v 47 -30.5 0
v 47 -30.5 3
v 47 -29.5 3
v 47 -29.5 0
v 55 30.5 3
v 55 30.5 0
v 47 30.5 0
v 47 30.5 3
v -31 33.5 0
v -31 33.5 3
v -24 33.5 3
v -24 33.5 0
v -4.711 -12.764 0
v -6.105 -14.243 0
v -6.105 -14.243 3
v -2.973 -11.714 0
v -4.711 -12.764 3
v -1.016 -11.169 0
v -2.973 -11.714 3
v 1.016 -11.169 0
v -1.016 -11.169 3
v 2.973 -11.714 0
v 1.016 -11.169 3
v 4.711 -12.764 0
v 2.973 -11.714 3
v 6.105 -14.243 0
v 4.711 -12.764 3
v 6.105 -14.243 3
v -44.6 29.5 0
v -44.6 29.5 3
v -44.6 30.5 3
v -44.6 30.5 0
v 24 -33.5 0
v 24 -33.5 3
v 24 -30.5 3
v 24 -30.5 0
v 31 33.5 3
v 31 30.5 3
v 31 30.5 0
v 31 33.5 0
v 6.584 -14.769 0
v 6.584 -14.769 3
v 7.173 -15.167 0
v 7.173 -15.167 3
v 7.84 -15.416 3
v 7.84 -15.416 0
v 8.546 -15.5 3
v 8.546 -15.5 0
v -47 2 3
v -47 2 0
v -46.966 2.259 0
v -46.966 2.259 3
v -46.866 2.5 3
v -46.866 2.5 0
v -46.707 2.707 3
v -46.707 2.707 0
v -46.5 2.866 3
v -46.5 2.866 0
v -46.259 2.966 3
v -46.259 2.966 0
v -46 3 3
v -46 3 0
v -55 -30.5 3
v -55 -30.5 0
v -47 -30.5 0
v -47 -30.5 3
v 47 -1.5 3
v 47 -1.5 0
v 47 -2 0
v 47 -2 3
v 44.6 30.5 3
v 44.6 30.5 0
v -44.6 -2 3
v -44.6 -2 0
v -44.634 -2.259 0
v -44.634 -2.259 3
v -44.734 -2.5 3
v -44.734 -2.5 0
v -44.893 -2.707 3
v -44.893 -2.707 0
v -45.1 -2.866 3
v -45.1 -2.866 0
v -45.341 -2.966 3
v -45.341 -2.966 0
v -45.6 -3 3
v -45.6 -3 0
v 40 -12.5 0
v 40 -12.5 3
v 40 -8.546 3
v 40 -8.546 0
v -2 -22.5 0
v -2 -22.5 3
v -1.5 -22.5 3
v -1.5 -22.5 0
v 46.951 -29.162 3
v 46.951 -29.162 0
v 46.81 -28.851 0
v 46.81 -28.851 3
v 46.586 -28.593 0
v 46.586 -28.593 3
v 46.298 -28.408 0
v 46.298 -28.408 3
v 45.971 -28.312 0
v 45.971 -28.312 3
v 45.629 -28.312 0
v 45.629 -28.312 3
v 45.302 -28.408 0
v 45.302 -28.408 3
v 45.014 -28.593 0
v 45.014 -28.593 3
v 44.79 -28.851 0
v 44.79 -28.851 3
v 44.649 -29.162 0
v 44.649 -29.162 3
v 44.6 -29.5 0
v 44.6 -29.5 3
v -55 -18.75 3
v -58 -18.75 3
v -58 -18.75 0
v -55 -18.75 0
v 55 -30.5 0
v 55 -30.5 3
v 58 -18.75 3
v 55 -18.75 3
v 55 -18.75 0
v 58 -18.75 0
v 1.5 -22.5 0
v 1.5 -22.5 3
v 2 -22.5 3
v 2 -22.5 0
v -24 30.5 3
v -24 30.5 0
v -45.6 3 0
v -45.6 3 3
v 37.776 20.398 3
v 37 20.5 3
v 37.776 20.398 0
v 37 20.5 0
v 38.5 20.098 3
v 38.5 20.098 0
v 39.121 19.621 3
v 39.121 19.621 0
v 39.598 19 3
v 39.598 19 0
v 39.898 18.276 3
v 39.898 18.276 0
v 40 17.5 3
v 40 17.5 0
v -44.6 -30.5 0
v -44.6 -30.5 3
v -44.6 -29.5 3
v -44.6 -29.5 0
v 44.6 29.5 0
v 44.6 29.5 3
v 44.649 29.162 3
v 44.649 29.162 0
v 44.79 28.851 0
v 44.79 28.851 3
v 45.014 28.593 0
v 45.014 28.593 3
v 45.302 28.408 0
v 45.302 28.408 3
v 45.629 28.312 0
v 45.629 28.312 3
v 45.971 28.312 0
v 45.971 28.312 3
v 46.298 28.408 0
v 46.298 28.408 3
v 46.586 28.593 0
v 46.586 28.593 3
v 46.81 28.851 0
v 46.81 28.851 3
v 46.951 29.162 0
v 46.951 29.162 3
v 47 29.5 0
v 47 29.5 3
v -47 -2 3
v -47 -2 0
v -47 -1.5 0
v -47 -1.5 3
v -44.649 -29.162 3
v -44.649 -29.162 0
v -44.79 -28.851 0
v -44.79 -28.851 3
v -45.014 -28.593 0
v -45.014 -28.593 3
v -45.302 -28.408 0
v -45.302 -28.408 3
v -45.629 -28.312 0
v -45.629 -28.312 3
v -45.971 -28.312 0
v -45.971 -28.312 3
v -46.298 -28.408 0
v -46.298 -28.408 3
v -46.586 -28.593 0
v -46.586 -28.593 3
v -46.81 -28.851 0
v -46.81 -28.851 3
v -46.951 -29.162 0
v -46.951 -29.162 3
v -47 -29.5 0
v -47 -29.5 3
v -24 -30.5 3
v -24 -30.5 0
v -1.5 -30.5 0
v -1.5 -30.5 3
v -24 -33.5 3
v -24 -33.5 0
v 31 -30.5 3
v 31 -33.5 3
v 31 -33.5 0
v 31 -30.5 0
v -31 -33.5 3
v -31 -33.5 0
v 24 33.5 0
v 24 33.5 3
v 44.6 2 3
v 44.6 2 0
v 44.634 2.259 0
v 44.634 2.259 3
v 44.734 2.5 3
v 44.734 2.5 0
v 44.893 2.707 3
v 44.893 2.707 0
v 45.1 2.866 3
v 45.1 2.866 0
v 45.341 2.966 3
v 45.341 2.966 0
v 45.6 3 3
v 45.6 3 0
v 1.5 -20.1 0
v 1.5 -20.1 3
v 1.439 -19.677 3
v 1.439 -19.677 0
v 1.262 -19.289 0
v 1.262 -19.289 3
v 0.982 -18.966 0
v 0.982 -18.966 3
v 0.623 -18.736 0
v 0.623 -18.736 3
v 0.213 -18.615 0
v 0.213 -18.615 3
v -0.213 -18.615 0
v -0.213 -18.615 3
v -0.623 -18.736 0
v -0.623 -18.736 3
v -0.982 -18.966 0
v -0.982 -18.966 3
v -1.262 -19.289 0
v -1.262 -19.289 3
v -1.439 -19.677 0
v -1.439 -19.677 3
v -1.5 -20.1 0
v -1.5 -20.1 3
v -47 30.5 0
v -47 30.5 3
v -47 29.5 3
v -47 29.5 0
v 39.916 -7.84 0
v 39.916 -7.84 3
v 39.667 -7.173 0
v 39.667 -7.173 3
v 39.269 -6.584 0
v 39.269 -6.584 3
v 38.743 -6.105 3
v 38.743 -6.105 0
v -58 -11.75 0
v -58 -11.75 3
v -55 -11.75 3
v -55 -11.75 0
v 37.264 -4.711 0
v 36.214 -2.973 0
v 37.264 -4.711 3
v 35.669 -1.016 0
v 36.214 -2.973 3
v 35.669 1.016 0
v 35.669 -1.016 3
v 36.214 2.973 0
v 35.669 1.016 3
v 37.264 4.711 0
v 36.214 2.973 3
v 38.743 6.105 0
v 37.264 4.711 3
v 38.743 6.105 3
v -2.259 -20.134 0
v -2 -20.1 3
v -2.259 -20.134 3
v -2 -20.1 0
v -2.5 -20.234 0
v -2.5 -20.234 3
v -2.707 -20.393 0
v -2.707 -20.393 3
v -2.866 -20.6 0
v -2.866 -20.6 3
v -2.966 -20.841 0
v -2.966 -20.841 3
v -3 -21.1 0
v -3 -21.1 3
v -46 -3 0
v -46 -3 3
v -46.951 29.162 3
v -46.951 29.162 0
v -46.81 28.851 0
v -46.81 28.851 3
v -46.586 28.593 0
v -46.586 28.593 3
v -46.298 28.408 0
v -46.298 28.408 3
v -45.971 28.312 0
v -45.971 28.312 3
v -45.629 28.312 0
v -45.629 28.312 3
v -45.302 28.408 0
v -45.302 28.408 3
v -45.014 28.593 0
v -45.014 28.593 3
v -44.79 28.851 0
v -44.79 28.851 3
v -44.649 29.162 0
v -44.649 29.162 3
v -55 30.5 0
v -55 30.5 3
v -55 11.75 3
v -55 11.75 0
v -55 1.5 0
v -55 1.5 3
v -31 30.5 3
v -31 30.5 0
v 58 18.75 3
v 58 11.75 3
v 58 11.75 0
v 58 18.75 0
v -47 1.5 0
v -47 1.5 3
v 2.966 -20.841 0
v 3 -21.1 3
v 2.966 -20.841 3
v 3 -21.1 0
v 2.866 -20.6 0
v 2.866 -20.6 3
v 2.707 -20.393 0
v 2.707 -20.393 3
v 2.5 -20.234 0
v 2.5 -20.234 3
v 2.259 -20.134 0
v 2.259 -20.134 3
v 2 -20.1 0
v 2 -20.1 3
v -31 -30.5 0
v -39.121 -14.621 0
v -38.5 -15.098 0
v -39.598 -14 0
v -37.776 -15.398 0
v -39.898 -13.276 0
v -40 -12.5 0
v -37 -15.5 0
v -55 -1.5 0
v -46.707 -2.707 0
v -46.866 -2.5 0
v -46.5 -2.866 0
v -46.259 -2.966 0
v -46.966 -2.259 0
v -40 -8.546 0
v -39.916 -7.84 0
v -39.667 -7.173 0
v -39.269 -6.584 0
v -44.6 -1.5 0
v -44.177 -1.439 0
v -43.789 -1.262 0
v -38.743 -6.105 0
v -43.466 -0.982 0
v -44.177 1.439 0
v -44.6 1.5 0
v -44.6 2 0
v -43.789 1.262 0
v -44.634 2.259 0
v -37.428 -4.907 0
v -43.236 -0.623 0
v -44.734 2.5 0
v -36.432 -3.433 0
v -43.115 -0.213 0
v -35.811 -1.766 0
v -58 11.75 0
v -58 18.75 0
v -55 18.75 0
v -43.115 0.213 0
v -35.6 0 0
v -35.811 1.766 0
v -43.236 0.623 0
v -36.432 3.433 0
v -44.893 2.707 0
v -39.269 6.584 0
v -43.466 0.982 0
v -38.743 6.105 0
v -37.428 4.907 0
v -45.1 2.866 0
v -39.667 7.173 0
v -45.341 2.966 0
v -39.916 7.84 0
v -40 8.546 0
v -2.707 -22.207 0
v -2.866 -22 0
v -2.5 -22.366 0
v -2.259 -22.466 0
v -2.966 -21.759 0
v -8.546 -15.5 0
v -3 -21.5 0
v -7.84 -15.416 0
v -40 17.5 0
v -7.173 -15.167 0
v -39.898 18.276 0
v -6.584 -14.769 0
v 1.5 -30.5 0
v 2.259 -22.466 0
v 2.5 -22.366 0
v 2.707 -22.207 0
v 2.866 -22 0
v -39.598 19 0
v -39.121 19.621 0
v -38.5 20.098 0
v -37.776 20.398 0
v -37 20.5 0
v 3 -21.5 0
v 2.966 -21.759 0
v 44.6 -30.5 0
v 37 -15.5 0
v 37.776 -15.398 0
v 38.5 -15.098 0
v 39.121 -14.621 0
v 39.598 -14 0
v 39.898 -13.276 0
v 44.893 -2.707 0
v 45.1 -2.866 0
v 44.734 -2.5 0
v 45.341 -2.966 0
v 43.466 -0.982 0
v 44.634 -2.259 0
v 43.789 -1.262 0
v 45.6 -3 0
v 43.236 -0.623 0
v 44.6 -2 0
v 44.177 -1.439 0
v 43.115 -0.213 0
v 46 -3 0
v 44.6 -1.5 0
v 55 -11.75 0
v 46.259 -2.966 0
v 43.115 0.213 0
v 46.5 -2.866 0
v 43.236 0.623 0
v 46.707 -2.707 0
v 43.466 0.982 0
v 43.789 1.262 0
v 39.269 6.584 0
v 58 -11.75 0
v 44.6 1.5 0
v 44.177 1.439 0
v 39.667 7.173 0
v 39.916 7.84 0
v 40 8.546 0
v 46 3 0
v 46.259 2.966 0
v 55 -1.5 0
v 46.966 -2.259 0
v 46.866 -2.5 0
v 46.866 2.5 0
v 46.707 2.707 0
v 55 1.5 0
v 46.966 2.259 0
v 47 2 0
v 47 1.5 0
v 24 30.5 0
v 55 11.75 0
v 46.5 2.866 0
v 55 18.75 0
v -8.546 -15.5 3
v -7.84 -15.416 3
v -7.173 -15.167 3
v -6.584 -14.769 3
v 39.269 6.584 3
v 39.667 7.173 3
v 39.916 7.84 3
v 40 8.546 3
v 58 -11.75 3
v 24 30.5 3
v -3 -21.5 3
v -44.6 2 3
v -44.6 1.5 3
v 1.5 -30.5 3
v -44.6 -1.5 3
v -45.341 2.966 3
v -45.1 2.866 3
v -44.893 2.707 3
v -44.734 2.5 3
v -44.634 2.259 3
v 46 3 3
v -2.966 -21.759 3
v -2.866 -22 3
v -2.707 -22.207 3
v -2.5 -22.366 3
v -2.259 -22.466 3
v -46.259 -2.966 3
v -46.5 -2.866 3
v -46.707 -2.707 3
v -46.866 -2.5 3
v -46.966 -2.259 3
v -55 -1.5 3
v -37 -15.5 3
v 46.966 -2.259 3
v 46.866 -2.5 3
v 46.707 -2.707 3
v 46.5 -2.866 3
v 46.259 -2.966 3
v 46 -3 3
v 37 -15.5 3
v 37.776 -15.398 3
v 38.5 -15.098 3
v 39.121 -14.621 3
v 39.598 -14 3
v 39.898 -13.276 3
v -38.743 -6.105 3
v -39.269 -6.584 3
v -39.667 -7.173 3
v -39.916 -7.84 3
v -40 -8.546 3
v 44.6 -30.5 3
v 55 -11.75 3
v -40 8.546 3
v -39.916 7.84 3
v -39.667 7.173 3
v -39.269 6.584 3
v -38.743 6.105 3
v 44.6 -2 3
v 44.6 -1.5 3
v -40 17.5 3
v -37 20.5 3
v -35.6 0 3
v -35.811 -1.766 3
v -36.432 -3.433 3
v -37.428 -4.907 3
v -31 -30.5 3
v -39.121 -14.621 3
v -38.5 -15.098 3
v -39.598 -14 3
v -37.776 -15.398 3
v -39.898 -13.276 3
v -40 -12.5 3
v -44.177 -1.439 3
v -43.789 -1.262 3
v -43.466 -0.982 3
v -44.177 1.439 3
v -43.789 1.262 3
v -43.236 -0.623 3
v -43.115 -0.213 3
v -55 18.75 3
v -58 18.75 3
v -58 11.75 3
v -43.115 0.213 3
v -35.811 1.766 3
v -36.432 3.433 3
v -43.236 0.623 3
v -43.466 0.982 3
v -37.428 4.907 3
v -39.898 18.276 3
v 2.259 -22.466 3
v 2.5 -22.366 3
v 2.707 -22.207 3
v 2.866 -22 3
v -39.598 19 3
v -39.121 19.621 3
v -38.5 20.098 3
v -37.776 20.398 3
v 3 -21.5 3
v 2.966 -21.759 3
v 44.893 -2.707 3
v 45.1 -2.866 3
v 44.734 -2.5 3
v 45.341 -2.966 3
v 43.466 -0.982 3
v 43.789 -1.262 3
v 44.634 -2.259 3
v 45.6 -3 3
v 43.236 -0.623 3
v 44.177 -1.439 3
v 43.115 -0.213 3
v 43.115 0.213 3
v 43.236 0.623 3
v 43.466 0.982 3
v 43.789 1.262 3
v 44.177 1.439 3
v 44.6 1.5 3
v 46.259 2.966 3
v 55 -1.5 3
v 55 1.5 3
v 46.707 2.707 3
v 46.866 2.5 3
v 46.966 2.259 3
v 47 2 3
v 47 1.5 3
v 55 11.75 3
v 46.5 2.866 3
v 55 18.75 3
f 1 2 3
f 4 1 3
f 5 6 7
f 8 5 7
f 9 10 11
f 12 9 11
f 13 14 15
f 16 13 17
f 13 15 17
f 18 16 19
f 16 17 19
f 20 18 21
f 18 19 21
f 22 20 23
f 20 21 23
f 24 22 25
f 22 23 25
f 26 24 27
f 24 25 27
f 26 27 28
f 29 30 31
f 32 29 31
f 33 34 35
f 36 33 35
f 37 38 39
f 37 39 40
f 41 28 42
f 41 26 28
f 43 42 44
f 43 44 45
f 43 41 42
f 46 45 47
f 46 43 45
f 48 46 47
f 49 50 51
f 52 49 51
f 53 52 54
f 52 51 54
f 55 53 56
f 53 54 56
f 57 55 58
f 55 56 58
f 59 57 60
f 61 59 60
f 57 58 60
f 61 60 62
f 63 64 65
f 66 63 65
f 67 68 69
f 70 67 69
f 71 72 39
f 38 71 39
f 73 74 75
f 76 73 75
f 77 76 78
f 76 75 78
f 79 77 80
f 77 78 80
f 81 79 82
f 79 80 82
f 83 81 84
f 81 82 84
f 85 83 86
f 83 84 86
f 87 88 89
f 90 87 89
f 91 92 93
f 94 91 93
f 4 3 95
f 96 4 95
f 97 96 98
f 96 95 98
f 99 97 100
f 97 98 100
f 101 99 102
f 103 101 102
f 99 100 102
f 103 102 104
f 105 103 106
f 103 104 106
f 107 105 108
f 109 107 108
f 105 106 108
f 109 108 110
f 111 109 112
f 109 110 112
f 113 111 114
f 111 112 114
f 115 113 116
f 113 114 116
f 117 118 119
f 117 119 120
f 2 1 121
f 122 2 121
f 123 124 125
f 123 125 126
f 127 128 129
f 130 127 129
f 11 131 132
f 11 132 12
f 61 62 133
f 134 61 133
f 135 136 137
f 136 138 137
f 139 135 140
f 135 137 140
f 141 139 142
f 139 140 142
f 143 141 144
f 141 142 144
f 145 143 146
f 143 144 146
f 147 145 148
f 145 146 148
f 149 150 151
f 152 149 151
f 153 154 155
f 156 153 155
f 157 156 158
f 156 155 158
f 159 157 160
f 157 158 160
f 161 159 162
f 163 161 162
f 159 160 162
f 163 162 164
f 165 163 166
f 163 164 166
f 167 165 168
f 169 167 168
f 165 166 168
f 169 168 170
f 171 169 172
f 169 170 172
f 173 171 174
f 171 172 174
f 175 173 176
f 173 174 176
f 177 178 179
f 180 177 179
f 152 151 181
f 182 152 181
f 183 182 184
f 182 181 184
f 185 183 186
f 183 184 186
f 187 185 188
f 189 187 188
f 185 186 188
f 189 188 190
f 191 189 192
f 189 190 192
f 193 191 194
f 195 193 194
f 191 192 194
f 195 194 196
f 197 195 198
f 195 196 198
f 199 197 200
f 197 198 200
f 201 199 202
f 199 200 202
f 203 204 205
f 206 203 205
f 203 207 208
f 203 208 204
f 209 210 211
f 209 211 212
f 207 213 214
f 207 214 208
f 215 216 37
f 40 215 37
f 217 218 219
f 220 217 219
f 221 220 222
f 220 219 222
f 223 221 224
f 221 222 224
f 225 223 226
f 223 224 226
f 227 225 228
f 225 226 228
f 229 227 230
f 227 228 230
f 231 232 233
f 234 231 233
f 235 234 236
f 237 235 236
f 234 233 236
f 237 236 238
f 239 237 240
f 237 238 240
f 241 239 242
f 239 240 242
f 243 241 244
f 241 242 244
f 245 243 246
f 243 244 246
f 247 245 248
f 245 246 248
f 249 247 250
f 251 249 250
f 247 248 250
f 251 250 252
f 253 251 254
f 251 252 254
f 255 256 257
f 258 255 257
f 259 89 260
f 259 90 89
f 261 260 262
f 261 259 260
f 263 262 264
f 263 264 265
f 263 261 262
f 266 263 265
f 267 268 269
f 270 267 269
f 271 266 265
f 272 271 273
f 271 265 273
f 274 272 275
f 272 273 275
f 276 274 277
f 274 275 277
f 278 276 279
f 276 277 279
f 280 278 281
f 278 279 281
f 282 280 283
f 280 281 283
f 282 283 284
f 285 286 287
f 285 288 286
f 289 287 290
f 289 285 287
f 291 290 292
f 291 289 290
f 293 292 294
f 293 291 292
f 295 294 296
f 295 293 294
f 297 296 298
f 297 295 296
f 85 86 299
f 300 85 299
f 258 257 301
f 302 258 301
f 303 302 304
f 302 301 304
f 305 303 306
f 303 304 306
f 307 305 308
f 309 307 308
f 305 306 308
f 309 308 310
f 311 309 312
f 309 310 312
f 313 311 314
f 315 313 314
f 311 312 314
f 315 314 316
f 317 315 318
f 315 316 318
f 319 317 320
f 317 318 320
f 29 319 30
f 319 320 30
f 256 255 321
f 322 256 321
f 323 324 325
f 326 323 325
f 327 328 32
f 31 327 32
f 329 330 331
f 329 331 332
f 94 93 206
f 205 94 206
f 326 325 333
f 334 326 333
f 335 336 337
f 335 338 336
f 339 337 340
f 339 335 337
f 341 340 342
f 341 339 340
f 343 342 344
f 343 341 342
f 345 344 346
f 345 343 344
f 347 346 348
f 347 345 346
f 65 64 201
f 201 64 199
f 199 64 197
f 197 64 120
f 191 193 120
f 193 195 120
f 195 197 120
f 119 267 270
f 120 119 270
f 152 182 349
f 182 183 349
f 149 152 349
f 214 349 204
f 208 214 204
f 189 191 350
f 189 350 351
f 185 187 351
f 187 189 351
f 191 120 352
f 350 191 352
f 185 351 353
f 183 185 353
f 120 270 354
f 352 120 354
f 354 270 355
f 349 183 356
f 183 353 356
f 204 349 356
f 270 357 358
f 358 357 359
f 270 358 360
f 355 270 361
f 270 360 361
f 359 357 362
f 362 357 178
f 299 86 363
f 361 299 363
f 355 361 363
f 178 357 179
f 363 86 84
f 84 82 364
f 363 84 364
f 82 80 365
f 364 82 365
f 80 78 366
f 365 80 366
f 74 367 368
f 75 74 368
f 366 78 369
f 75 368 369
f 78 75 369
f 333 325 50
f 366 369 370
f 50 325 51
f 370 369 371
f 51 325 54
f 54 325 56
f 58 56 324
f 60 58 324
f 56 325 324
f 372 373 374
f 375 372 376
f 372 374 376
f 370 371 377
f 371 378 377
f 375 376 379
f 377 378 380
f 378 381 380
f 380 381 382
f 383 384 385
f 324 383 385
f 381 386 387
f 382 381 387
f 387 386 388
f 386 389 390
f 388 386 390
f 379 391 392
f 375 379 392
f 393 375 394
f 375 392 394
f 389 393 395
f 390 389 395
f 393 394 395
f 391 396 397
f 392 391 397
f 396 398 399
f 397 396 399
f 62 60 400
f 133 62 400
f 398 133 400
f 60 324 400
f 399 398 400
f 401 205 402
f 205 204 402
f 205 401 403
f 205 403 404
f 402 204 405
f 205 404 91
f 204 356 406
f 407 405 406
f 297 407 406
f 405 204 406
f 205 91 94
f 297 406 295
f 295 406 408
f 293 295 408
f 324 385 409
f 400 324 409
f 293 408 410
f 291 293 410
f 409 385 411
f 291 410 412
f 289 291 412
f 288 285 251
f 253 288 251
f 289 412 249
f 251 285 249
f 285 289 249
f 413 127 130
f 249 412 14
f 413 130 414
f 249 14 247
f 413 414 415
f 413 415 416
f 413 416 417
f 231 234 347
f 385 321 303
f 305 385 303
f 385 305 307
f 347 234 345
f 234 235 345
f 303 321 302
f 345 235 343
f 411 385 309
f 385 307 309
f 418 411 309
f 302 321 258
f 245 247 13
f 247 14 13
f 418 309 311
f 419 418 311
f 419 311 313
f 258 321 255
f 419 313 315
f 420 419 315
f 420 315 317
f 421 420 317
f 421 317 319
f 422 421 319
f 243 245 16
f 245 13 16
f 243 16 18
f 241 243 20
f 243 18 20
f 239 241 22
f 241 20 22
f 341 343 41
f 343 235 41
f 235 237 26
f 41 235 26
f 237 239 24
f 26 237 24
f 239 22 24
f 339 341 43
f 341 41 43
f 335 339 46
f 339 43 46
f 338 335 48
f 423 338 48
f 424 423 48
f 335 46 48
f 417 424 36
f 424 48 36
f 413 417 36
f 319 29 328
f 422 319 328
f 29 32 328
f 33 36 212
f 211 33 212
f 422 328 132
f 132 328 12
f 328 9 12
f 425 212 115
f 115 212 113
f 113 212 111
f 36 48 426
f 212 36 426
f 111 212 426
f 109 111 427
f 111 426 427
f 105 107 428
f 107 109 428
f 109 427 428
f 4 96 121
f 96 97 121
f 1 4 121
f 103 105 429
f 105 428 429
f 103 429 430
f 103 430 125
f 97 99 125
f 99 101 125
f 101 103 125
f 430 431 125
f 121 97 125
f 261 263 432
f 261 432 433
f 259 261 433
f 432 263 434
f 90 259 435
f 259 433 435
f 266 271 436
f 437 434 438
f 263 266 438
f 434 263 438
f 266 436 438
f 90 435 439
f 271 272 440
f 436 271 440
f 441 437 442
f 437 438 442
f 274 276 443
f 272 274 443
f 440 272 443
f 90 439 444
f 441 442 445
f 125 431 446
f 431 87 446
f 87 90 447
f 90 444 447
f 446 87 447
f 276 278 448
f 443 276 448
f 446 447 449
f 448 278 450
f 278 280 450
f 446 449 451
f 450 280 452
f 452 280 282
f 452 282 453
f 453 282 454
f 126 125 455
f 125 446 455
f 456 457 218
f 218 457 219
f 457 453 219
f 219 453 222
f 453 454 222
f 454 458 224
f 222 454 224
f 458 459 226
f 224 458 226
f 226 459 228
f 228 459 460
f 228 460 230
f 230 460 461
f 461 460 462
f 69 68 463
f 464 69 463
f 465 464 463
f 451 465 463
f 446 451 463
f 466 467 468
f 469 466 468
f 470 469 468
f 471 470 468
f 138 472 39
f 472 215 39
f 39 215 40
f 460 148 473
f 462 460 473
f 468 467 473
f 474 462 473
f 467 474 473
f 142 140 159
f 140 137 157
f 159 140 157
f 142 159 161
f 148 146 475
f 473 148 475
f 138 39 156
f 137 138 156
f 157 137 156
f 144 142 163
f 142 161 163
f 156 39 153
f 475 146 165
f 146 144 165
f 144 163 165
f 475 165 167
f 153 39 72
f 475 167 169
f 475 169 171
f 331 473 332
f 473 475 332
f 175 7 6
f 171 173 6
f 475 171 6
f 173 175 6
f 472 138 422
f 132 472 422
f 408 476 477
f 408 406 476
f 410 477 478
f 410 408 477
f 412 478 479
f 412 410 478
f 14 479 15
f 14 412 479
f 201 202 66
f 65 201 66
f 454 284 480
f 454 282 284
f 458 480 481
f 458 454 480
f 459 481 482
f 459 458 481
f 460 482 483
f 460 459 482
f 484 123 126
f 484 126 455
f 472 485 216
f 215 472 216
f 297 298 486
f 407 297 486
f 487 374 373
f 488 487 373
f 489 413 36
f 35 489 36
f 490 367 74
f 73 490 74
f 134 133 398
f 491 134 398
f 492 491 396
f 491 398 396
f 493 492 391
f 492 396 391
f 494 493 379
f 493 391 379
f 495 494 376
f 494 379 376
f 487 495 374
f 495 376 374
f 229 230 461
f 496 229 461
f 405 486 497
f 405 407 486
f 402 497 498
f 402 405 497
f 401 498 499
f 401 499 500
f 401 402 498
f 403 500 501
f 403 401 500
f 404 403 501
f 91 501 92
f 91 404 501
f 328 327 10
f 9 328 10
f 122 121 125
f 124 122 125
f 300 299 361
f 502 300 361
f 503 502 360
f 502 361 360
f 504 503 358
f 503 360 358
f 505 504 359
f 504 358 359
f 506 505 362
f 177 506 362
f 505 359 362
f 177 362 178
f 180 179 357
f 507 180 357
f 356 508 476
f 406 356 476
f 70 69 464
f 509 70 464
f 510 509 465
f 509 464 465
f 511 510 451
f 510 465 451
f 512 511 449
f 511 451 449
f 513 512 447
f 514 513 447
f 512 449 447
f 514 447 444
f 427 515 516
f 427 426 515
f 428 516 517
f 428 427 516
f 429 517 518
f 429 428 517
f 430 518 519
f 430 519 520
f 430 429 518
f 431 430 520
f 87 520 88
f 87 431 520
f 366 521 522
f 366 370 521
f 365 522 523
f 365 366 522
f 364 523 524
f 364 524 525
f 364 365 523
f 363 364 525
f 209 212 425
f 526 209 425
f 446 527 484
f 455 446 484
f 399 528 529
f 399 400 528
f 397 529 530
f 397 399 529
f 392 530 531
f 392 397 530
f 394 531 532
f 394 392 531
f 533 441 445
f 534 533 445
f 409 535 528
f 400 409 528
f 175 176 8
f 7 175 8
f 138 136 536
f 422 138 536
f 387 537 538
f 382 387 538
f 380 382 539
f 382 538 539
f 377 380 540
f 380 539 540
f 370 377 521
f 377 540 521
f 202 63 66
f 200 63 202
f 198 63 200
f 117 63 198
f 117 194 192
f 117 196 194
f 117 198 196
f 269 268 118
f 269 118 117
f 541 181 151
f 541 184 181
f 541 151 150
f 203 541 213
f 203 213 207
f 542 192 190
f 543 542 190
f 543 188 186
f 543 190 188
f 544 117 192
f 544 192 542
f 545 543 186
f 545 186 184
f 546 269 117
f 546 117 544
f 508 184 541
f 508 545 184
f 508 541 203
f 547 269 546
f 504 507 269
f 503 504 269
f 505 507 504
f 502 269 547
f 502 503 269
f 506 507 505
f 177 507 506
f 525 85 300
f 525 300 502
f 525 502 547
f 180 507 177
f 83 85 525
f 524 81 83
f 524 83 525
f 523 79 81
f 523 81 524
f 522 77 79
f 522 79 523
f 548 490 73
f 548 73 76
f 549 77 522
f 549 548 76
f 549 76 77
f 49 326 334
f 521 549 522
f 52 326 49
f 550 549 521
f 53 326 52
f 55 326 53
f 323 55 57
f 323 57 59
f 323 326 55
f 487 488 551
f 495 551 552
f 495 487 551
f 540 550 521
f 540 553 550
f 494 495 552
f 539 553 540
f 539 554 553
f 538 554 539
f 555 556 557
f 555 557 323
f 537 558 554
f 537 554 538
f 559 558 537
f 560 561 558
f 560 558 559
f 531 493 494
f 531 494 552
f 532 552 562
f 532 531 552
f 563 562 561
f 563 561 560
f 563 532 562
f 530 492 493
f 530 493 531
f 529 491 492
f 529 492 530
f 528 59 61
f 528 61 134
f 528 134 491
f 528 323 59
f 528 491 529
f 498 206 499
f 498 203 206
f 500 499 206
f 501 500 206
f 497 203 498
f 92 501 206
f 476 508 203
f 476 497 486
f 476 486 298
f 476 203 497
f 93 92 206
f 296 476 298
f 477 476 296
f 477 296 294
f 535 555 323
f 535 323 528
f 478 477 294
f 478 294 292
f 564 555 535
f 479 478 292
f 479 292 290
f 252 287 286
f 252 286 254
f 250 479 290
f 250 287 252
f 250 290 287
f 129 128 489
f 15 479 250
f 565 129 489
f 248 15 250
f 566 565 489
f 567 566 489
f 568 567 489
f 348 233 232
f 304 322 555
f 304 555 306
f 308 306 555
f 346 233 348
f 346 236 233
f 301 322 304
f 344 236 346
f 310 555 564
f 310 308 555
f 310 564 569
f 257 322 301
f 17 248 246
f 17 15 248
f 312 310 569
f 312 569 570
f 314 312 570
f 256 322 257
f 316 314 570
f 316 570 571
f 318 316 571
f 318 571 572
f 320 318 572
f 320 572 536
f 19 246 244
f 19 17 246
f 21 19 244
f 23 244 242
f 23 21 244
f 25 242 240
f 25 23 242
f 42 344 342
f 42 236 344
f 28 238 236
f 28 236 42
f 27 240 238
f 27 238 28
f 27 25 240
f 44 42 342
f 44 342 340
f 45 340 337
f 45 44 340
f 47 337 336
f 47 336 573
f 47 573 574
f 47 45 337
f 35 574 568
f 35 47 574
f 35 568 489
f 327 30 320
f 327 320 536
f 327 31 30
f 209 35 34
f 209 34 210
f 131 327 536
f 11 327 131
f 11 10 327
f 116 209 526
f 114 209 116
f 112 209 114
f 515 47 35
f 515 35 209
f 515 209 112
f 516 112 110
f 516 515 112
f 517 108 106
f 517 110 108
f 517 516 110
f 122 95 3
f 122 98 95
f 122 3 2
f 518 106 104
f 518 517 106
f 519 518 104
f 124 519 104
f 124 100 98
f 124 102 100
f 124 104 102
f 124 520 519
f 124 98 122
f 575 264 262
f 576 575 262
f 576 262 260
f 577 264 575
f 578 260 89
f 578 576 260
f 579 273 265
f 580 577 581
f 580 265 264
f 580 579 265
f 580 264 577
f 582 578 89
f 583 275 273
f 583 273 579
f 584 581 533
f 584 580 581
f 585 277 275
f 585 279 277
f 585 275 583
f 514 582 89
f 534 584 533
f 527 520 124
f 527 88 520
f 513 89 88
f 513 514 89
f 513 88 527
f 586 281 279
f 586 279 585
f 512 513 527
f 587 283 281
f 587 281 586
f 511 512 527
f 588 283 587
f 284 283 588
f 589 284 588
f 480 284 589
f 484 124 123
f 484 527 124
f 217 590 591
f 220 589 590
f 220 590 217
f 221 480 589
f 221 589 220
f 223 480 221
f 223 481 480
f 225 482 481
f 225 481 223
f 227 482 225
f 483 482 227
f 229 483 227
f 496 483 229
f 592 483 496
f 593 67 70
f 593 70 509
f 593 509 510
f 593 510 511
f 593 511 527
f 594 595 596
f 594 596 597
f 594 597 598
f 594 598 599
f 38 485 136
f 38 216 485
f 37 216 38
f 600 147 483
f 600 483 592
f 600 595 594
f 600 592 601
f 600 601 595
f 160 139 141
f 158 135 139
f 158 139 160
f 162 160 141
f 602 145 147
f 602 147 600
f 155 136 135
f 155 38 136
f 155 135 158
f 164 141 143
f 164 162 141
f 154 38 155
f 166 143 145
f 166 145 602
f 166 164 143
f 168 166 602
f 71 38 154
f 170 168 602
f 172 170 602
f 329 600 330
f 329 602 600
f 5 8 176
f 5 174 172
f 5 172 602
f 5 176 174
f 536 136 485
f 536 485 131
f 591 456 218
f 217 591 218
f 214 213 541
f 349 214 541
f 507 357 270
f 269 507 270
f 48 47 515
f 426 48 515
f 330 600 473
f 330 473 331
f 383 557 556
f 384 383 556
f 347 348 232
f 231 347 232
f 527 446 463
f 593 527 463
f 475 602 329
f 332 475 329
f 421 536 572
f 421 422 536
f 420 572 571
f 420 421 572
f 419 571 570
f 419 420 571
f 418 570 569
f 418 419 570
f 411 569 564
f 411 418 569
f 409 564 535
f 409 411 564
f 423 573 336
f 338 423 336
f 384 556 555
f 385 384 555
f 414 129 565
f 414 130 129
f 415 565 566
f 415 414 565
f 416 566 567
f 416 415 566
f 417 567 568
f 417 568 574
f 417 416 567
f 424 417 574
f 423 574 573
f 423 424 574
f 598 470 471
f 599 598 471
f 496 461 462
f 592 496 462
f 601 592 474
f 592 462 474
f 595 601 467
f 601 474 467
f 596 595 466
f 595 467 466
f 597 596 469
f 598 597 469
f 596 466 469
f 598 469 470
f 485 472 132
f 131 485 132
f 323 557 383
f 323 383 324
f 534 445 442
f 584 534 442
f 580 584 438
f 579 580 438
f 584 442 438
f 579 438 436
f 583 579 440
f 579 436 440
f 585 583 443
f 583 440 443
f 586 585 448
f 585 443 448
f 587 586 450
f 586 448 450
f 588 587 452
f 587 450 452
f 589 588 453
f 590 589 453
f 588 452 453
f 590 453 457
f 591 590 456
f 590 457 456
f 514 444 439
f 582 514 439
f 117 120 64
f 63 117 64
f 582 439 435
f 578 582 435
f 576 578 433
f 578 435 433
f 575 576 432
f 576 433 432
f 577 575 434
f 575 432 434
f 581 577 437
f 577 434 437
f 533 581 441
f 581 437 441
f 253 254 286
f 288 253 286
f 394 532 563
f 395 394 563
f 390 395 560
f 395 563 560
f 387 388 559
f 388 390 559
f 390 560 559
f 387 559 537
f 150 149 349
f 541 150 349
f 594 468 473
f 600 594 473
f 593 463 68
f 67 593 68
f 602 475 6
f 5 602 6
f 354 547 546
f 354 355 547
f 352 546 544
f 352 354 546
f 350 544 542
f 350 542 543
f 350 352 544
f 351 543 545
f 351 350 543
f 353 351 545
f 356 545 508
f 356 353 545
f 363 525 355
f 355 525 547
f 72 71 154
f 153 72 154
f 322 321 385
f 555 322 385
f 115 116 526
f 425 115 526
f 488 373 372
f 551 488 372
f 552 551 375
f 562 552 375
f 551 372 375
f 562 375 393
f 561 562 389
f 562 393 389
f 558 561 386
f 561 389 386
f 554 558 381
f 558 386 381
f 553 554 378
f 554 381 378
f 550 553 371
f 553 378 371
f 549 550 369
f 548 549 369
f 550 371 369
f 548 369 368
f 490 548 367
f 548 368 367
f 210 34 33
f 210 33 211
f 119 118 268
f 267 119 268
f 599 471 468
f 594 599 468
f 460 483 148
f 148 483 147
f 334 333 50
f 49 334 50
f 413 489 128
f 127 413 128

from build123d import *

# Parameters (mm, degrees)
BOSS_EXTRUDE1_DEPTH = 3
CUT_EXTRUDE1_DEPTH  = 3
CUT_EXTRUDE3_DEPTH  = 3
FILLET2_R           = 1
CUT_EXTRUDE4_DEPTH  = 10
FILLET3_R           = 3
SKETCH5_W           = 3
SKETCH5_H           = 7
SKETCH5_W_2         = 7
SKETCH5_H_2         = 3
BOSS_EXTRUDE2_DEPTH = 3


with BuildPart() as part:
    # Sketch1 → Boss-Extrude1 (new body)
    with BuildSketch(Plane.XY):
        with BuildLine():
            Line((55, 30.5), (-55, 30.5))
            Line((-55, 30.5), (-55, 1.5))
            Line((-55, 1.5), (-47, 1.5))
            Line((-47, 1.5), (-47, 2))
            Line((-47, 2), (-47, 3))
            Line((-47, 3), (-46, 3))
            Line((-46, 3), (-45.6, 3))
            Line((-45.6, 3), (-44.6, 3))
            Line((-44.6, 3), (-44.6, 2))
            Line((-44.6, 2), (-44.6, 1.5))
            ThreePointArc((-44.6, 1.5), (-43.1, 0), (-44.6, -1.5))
            Line((-44.6, -1.5), (-44.6, -2))
            Line((-44.6, -2), (-44.6, -3))
            Line((-44.6, -3), (-45.6, -3))
            Line((-45.6, -3), (-46, -3))
            Line((-46, -3), (-47, -3))
            Line((-47, -3), (-47, -2))
            Line((-47, -2), (-47, -1.5))
            Line((-47, -1.5), (-55, -1.5))
            Line((-55, -1.5), (-55, -30.5))
            Line((-55, -30.5), (55, -30.5))
            Line((55, -30.5), (55, -1.5))
            Line((55, -1.5), (47, -1.5))
            Line((47, -1.5), (47, -2))
            Line((47, -2), (47, -3))
            Line((47, -3), (46, -3))
            Line((46, -3), (45.6, -3))
            Line((45.6, -3), (44.6, -3))
            Line((44.6, -3), (44.6, -2))
            Line((44.6, -2), (44.6, -1.5))
            ThreePointArc((44.6, -1.5), (43.1, 0), (44.6, 1.5))
            Line((44.6, 1.5), (44.6, 2))
            Line((44.6, 2), (44.6, 3))
            Line((44.6, 3), (45.6, 3))
            Line((45.6, 3), (46, 3))
            Line((46, 3), (47, 3))
            Line((47, 3), (47, 2))
            Line((47, 2), (47, 1.5))
            Line((47, 1.5), (55, 1.5))
            Line((55, 1.5), (55, 30.5))
        make_face()
        with BuildLine():
            ThreePointArc((-46, -3), (-46.707106781, -2.707106781), (-47, -2))
            Line((-47, -2), (-47, -3))
            Line((-47, -3), (-46, -3))
        make_face()
        with BuildLine():
            ThreePointArc((-44.6, -2), (-44.892893219, -2.707106781), (-45.6, -3))
            Line((-45.6, -3), (-44.6, -3))
            Line((-44.6, -3), (-44.6, -2))
        make_face()
        with BuildLine():
            Line((-44.6, 3), (-45.6, 3))
            ThreePointArc((-45.6, 3), (-44.892893219, 2.707106781), (-44.6, 2))
            Line((-44.6, 2), (-44.6, 3))
        make_face()
        with BuildLine():
            Line((-47, 3), (-47, 2))
            ThreePointArc((-47, 2), (-46.707106781, 2.707106781), (-46, 3))
            Line((-46, 3), (-47, 3))
        make_face()
        with BuildLine():
            Line((44.6, -3), (45.6, -3))
            ThreePointArc((45.6, -3), (44.892893219, -2.707106781), (44.6, -2))
            Line((44.6, -2), (44.6, -3))
        make_face()
        with BuildLine():
            Line((47, -3), (47, -2))
            ThreePointArc((47, -2), (46.707106781, -2.707106781), (46, -3))
            Line((46, -3), (47, -3))
        make_face()
        with BuildLine():
            ThreePointArc((46, 3), (46.707106781, 2.707106781), (47, 2))
            Line((47, 2), (47, 3))
            Line((47, 3), (46, 3))
        make_face()
        with BuildLine():
            ThreePointArc((44.6, 2), (44.892893219, 2.707106781), (45.6, 3))
            Line((45.6, 3), (44.6, 3))
            Line((44.6, 3), (44.6, 2))
        make_face()
    extrude(amount=BOSS_EXTRUDE1_DEPTH)

    # Sketch2 → Cut-Extrude1 (cut)
    with BuildSketch(Plane.XY.offset(3)):
        with BuildLine():
            Line((45.136675042, 30.5), (44.6, 30.5))
            Line((44.6, 30.5), (44.6, 29.5))
            ThreePointArc((44.6, 29.5), (45.8, 28.3), (47, 29.5))
            Line((47, 29.5), (47, 30.5))
            Line((47, 30.5), (46.463324958, 30.5))
            Line((46.463324958, 30.5), (45.136675042, 30.5))
        make_face()
        with BuildLine():
            Line((44.6, -29.5), (44.6, -30.5))
            Line((44.6, -30.5), (45.136675042, -30.5))
            Line((45.136675042, -30.5), (46.463324958, -30.5))
            Line((46.463324958, -30.5), (47, -30.5))
            Line((47, -30.5), (47, -29.5))
            ThreePointArc((47, -29.5), (45.8, -28.3), (44.6, -29.5))
        make_face()
        with BuildLine():
            ThreePointArc((-44.6, -29.5), (-45.8, -28.3), (-47, -29.5))
            Line((-47, -29.5), (-47, -30.5))
            Line((-47, -30.5), (-46.463324958, -30.5))
            Line((-46.463324958, -30.5), (-45.136675042, -30.5))
            Line((-45.136675042, -30.5), (-44.6, -30.5))
            Line((-44.6, -30.5), (-44.6, -29.5))
        make_face()
        with BuildLine():
            Line((-47, 30.5), (-47, 29.5))
            ThreePointArc((-47, 29.5), (-45.8, 28.3), (-44.6, 29.5))
            Line((-44.6, 29.5), (-44.6, 30.5))
            Line((-44.6, 30.5), (-45.136675042, 30.5))
            Line((-45.136675042, 30.5), (-46.463324958, 30.5))
            Line((-46.463324958, 30.5), (-47, 30.5))
        make_face()
    extrude(amount=-CUT_EXTRUDE1_DEPTH, mode=Mode.SUBTRACT)

    # Sketch3 → Cut-Extrude3 (cut)
    with BuildSketch(Plane.XY.offset(3)):
        with BuildLine():
            ThreePointArc((1.5, -20.1), (0, -18.6), (-1.5, -20.1))
            Line((-1.5, -20.1), (-3, -20.1))
            Line((-3, -20.1), (-3, -22.5))
            Line((-3, -22.5), (-1.5, -22.5))
            Line((-1.5, -22.5), (-1.5, -30.5))
            Line((-1.5, -30.5), (0, -30.5))
            Line((0, -30.5), (1.5, -30.5))
            Line((1.5, -30.5), (1.5, -22.5))
            Line((1.5, -22.5), (3, -22.5))
            Line((3, -22.5), (3, -20.1))
            Line((3, -20.1), (1.5, -20.1))
        make_face()
    extrude(amount=-CUT_EXTRUDE3_DEPTH, mode=Mode.SUBTRACT)

    # Fillet2
    fillet2_edges = [part.edges().sort_by_distance(p)[0] for p in [
        (3, -20.1, 1.5),
        (3, -22.5, 1.5),
        (-3, -22.5, 1.5),
        (-3, -20.1, 1.5),
    ]]
    fillet(fillet2_edges, radius=FILLET2_R)

    # Sketch4 → Cut-Extrude4 (cut)
    with BuildSketch(Plane.XY.offset(3)):
        with BuildLine():
            Line((40, 20.5), (-40, 20.5))
            Line((-40, 20.5), (-40, 6.829348432))
            ThreePointArc((-40, 6.829348432), (-36.795239894, 4.062019202), (-35.6, 0))
            ThreePointArc((-35.6, 0), (-36.795239894, -4.062019202), (-40, -6.829348432))
            Line((-40, -6.829348432), (-40, -15.5))
            Line((-40, -15.5), (-6.829348432, -15.5))
            ThreePointArc((-6.829348432, -15.5), (0, -11.1), (6.829348432, -15.5))
            Line((6.829348432, -15.5), (40, -15.5))
            Line((40, -15.5), (40, -6.829348432))
            ThreePointArc((40, -6.829348432), (35.6, 0), (40, 6.829348432))
            Line((40, 6.829348432), (40, 20.5))
        make_face()
    extrude(amount=-CUT_EXTRUDE4_DEPTH, mode=Mode.SUBTRACT)

    # Fillet3
    fillet3_edges = [part.edges().sort_by_distance(p)[0] for p in [
        (40, 6.829348432, 1.5),
        (40, -6.829348432, 1.5),
        (40, -15.5, 1.5),
        (6.829348432, -15.5, 1.5),
        (-6.829348432, -15.5, 1.5),
        (-40, -15.5, 1.5),
        (-40, -6.829348432, 1.5),
        (-40, 6.829348432, 1.5),
        (-40, 20.5, 1.5),
        (40, 20.5, 1.5),
    ]]
    fillet(fillet3_edges, radius=FILLET3_R)

    # Sketch5 → Boss-Extrude2 (add)
    with BuildSketch(Plane.XY.offset(3)):
        with Locations((-56.5, 15.25)):
            Rectangle(SKETCH5_W, SKETCH5_H)
        with Locations((-56.5, -15.25)):
            Rectangle(SKETCH5_W, SKETCH5_H)
        with Locations((56.5, -15.25)):
            Rectangle(SKETCH5_W, SKETCH5_H)
        with Locations((56.5, 15.25)):
            Rectangle(SKETCH5_W, SKETCH5_H)
        with Locations((27.5, -32)):
            Rectangle(SKETCH5_W_2, SKETCH5_H_2)
        with Locations((-27.5, -32)):
            Rectangle(SKETCH5_W_2, SKETCH5_H_2)
        with Locations((-27.5, 32)):
            Rectangle(SKETCH5_W_2, SKETCH5_H_2)
        with Locations((27.5, 32)):
            Rectangle(SKETCH5_W_2, SKETCH5_H_2)
    extrude(amount=-BOSS_EXTRUDE2_DEPTH)


solid = part.part
